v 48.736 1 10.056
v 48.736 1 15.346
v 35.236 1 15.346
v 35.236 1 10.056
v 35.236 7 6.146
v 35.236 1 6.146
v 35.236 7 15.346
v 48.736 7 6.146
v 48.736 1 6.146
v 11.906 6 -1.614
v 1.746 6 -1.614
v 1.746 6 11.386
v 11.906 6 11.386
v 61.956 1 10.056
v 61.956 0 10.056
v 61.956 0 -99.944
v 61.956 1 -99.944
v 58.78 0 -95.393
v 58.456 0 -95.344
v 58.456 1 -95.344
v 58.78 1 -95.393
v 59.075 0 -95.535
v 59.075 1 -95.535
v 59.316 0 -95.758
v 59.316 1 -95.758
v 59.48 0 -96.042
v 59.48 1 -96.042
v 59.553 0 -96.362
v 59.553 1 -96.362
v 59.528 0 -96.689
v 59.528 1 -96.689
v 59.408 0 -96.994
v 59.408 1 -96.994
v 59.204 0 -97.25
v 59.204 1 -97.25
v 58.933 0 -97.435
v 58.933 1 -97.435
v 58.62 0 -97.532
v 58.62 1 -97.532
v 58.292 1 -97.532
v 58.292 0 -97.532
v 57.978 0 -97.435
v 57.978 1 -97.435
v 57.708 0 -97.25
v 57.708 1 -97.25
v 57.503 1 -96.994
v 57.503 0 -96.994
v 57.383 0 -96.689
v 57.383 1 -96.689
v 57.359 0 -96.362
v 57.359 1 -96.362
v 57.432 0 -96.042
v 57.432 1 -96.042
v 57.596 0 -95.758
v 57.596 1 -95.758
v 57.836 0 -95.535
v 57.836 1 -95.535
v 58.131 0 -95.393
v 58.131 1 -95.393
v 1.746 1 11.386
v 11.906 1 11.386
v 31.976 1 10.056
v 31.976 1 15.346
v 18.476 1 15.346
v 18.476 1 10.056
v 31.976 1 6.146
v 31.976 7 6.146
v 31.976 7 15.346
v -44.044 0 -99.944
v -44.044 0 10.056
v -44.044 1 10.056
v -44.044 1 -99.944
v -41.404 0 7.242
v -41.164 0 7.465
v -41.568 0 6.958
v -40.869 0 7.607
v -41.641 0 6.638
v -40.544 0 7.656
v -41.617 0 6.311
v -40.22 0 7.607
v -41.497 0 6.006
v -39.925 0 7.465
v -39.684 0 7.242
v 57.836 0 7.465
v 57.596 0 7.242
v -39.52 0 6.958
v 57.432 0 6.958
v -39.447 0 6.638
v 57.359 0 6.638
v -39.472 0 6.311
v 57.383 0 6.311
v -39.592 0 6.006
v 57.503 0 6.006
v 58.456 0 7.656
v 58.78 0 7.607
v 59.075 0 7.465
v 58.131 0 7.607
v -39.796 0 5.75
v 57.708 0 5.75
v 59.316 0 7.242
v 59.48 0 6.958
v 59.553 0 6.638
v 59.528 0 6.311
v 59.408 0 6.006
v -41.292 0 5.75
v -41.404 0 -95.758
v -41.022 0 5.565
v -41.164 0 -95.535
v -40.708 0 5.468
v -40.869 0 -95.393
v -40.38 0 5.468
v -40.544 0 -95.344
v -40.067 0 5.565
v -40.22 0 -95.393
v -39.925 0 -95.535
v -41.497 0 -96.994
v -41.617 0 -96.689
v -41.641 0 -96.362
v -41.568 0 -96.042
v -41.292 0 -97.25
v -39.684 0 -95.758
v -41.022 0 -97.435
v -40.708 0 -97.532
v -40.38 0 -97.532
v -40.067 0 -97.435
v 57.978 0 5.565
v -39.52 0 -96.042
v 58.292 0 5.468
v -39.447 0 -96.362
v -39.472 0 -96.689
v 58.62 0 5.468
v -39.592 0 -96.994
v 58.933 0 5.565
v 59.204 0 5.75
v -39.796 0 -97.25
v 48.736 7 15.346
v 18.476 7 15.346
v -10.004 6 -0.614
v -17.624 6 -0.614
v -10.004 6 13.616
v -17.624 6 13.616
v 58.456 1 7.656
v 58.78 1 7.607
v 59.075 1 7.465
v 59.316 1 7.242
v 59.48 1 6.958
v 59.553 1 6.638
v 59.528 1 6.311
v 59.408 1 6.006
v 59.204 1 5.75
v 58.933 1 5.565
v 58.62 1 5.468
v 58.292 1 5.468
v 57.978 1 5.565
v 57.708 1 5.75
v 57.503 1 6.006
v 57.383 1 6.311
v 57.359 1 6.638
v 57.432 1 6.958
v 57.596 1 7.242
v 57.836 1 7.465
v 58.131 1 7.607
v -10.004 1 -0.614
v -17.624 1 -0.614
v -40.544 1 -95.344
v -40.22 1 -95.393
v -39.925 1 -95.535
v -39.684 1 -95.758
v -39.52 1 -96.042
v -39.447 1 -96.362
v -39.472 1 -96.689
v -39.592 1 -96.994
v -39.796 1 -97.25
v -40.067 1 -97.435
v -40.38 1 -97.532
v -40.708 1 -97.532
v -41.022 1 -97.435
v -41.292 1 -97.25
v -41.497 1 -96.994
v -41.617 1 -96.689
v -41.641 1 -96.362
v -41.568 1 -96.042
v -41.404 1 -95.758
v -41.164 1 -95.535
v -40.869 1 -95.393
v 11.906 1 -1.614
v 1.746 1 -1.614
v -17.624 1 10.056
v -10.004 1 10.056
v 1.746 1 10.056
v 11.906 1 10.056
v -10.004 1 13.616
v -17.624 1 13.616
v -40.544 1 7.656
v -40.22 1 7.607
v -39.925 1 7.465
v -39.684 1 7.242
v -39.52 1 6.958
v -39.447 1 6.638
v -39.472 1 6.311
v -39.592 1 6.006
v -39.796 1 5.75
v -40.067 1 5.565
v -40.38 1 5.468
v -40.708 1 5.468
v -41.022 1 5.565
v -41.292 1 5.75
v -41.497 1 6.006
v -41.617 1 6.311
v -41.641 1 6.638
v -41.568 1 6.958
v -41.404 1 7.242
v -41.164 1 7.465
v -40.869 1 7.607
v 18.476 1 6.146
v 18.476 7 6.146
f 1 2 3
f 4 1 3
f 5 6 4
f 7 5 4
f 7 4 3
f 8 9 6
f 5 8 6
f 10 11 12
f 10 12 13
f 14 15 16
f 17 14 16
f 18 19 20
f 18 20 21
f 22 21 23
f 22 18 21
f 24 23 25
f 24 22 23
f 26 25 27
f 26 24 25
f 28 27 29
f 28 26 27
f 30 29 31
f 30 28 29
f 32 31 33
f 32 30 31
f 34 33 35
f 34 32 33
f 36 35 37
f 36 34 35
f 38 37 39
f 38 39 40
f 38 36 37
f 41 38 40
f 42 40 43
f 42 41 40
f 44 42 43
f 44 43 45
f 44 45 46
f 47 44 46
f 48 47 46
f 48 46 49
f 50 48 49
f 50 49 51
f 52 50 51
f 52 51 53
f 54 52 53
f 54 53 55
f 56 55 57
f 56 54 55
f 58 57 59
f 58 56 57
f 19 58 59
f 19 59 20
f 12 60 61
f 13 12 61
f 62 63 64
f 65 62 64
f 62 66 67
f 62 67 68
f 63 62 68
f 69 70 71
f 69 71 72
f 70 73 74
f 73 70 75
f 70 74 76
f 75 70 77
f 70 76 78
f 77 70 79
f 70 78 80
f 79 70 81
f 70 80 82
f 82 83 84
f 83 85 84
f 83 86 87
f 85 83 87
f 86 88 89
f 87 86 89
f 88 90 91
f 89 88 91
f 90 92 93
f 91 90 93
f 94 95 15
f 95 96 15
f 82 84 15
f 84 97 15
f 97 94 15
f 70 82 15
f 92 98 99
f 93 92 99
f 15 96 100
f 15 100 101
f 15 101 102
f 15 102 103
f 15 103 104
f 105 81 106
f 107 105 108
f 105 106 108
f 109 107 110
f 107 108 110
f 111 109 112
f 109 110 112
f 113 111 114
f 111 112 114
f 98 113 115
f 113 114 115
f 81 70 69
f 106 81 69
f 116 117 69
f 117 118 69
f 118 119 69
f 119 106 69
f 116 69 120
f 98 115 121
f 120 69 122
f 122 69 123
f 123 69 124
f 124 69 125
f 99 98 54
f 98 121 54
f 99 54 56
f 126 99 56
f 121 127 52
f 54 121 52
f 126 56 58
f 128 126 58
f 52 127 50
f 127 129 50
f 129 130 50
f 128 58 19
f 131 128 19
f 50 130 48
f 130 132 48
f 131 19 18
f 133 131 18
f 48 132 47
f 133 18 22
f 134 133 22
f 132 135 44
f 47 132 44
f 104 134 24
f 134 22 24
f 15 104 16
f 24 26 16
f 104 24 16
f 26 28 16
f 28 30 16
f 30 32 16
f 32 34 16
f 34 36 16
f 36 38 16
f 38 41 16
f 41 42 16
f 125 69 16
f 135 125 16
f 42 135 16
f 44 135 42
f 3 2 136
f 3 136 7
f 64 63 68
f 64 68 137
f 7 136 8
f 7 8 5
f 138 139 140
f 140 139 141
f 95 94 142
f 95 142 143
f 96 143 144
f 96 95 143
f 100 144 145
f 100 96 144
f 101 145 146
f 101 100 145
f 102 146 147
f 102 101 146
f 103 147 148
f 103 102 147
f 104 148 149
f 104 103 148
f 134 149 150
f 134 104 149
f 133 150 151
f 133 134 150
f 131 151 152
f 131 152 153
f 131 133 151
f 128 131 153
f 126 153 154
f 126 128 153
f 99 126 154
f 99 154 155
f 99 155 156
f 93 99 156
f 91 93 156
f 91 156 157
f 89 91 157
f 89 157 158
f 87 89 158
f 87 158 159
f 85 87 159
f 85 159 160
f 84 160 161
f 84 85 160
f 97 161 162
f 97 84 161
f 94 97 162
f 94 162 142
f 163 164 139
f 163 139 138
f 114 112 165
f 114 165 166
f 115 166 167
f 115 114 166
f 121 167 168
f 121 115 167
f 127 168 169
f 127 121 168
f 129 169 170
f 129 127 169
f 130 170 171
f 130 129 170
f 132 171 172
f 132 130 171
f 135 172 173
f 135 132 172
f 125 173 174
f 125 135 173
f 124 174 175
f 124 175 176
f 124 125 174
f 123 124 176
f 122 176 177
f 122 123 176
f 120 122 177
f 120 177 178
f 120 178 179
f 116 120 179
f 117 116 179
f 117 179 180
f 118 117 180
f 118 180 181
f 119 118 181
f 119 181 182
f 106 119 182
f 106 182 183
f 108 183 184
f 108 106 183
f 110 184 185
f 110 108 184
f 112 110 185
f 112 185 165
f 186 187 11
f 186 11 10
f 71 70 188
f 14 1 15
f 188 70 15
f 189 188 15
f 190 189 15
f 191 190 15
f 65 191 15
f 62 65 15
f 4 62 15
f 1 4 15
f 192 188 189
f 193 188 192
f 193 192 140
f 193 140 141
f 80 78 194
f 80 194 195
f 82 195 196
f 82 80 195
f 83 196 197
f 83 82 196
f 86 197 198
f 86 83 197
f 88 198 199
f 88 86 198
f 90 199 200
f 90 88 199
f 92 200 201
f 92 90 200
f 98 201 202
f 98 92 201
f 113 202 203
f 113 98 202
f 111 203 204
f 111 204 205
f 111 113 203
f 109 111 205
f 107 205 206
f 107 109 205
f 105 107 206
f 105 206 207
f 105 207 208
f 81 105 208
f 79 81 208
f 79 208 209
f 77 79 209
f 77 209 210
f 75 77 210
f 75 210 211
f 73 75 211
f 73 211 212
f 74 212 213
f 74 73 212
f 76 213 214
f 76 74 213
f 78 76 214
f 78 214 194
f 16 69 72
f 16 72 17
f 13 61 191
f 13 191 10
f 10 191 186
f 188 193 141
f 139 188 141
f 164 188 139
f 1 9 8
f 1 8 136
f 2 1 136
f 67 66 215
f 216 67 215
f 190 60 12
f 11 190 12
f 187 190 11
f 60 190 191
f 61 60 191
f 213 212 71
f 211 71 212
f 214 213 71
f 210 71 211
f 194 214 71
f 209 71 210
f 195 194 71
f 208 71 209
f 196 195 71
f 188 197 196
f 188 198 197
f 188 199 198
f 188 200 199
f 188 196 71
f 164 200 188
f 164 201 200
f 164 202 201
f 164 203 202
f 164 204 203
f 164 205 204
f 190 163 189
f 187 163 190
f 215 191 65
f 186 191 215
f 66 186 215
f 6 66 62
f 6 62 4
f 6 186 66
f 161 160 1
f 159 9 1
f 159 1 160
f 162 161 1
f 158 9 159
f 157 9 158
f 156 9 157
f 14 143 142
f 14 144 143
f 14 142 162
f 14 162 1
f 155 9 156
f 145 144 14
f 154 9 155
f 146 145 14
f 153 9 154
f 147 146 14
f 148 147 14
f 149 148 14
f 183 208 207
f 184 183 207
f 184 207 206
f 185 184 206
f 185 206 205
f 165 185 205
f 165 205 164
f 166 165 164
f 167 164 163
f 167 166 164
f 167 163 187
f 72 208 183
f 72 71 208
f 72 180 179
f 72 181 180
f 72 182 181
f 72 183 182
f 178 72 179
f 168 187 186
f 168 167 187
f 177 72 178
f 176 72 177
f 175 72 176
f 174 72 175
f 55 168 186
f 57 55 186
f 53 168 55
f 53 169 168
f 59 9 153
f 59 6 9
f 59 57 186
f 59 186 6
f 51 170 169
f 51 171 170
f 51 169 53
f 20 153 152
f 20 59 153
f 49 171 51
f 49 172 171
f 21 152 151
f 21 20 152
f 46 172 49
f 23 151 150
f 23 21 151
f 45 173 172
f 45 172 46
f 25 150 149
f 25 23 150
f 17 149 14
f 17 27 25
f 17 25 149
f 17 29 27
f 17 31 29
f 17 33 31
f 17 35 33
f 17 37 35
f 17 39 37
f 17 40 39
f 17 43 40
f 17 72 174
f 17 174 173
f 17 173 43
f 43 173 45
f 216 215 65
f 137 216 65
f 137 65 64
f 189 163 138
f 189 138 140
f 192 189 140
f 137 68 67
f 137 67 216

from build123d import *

# Parameters (mm, degrees)
SKETCH1_W           = 106
SKETCH1_H           = 110
SKETCH1_R           = 1.1
BOSS_EXTRUDE1_DEPTH = 1
BOSS_EXTRUDE3_DEPTH = 5
SKETCH3_W           = 10.16
SKETCH3_H           = 13
BOSS_EXTRUDE4_DEPTH = 5
SKETCH4_W           = 13.5
SKETCH4_H           = 9.2
BOSS_EXTRUDE5_DEPTH = 6


with BuildPart() as part:
    # Sketch1 → Boss-Extrude1 (new body)
    with BuildSketch(Plane(origin=(0, 0, 0), x_dir=(1, 0, 0), z_dir=(0, 1, 0))):
        with Locations((8.955727632, 44.943820005)):
            Rectangle(SKETCH1_W, SKETCH1_H)
        with Locations(Location((-40.544272368, -6.556179995, 0), (0, 0, 270))):
            Circle(SKETCH1_R, mode=Mode.SUBTRACT)
        with Locations(Location((58.455727632, -6.556179995, 0), (0, 0, 270))):
            Circle(SKETCH1_R, mode=Mode.SUBTRACT)
        with Locations(Location((-40.544272368, 96.443820005, 0), (0, 0, 270))):
            Circle(SKETCH1_R, mode=Mode.SUBTRACT)
        with Locations(Location((58.455727632, 96.443820005, 0), (0, 0, 270))):
            Circle(SKETCH1_R, mode=Mode.SUBTRACT)
    extrude(amount=BOSS_EXTRUDE1_DEPTH)

    # 3DSketch1 → Boss-Extrude3 (add)
    with BuildSketch(Plane(origin=(-17.624272368, 1, -0.613820005), x_dir=(0.47206668121683765, 0, 0.8815628443196325), z_dir=(0, -1, 0))):
        Polygon((0, 0), (3.597148111, -6.717508874), (16.141787386, 0), (12.544639275, 6.717508874), align=None)
    extrude(amount=-BOSS_EXTRUDE3_DEPTH)

    # Sketch3 → Boss-Extrude4 (add)
    with BuildSketch(Plane(origin=(0, 1, 0), x_dir=(1, 0, 0), z_dir=(0, 1, 0))):
        with Locations((6.825727632, -4.886179995)):
            Rectangle(SKETCH3_W, SKETCH3_H)
    extrude(amount=BOSS_EXTRUDE4_DEPTH)

    # Sketch4 → Boss-Extrude5 (add)
    with BuildSketch(Plane(origin=(0, 1, 0), x_dir=(-1, 0, 0), z_dir=(0, 1, 0))):
        with Locations((-41.985727632, 10.746179995)):
            Rectangle(SKETCH4_W, SKETCH4_H)
        with Locations((-25.225727632, 10.746179995)):
            Rectangle(SKETCH4_W, SKETCH4_H)
    extrude(amount=BOSS_EXTRUDE5_DEPTH)


solid = part.part
